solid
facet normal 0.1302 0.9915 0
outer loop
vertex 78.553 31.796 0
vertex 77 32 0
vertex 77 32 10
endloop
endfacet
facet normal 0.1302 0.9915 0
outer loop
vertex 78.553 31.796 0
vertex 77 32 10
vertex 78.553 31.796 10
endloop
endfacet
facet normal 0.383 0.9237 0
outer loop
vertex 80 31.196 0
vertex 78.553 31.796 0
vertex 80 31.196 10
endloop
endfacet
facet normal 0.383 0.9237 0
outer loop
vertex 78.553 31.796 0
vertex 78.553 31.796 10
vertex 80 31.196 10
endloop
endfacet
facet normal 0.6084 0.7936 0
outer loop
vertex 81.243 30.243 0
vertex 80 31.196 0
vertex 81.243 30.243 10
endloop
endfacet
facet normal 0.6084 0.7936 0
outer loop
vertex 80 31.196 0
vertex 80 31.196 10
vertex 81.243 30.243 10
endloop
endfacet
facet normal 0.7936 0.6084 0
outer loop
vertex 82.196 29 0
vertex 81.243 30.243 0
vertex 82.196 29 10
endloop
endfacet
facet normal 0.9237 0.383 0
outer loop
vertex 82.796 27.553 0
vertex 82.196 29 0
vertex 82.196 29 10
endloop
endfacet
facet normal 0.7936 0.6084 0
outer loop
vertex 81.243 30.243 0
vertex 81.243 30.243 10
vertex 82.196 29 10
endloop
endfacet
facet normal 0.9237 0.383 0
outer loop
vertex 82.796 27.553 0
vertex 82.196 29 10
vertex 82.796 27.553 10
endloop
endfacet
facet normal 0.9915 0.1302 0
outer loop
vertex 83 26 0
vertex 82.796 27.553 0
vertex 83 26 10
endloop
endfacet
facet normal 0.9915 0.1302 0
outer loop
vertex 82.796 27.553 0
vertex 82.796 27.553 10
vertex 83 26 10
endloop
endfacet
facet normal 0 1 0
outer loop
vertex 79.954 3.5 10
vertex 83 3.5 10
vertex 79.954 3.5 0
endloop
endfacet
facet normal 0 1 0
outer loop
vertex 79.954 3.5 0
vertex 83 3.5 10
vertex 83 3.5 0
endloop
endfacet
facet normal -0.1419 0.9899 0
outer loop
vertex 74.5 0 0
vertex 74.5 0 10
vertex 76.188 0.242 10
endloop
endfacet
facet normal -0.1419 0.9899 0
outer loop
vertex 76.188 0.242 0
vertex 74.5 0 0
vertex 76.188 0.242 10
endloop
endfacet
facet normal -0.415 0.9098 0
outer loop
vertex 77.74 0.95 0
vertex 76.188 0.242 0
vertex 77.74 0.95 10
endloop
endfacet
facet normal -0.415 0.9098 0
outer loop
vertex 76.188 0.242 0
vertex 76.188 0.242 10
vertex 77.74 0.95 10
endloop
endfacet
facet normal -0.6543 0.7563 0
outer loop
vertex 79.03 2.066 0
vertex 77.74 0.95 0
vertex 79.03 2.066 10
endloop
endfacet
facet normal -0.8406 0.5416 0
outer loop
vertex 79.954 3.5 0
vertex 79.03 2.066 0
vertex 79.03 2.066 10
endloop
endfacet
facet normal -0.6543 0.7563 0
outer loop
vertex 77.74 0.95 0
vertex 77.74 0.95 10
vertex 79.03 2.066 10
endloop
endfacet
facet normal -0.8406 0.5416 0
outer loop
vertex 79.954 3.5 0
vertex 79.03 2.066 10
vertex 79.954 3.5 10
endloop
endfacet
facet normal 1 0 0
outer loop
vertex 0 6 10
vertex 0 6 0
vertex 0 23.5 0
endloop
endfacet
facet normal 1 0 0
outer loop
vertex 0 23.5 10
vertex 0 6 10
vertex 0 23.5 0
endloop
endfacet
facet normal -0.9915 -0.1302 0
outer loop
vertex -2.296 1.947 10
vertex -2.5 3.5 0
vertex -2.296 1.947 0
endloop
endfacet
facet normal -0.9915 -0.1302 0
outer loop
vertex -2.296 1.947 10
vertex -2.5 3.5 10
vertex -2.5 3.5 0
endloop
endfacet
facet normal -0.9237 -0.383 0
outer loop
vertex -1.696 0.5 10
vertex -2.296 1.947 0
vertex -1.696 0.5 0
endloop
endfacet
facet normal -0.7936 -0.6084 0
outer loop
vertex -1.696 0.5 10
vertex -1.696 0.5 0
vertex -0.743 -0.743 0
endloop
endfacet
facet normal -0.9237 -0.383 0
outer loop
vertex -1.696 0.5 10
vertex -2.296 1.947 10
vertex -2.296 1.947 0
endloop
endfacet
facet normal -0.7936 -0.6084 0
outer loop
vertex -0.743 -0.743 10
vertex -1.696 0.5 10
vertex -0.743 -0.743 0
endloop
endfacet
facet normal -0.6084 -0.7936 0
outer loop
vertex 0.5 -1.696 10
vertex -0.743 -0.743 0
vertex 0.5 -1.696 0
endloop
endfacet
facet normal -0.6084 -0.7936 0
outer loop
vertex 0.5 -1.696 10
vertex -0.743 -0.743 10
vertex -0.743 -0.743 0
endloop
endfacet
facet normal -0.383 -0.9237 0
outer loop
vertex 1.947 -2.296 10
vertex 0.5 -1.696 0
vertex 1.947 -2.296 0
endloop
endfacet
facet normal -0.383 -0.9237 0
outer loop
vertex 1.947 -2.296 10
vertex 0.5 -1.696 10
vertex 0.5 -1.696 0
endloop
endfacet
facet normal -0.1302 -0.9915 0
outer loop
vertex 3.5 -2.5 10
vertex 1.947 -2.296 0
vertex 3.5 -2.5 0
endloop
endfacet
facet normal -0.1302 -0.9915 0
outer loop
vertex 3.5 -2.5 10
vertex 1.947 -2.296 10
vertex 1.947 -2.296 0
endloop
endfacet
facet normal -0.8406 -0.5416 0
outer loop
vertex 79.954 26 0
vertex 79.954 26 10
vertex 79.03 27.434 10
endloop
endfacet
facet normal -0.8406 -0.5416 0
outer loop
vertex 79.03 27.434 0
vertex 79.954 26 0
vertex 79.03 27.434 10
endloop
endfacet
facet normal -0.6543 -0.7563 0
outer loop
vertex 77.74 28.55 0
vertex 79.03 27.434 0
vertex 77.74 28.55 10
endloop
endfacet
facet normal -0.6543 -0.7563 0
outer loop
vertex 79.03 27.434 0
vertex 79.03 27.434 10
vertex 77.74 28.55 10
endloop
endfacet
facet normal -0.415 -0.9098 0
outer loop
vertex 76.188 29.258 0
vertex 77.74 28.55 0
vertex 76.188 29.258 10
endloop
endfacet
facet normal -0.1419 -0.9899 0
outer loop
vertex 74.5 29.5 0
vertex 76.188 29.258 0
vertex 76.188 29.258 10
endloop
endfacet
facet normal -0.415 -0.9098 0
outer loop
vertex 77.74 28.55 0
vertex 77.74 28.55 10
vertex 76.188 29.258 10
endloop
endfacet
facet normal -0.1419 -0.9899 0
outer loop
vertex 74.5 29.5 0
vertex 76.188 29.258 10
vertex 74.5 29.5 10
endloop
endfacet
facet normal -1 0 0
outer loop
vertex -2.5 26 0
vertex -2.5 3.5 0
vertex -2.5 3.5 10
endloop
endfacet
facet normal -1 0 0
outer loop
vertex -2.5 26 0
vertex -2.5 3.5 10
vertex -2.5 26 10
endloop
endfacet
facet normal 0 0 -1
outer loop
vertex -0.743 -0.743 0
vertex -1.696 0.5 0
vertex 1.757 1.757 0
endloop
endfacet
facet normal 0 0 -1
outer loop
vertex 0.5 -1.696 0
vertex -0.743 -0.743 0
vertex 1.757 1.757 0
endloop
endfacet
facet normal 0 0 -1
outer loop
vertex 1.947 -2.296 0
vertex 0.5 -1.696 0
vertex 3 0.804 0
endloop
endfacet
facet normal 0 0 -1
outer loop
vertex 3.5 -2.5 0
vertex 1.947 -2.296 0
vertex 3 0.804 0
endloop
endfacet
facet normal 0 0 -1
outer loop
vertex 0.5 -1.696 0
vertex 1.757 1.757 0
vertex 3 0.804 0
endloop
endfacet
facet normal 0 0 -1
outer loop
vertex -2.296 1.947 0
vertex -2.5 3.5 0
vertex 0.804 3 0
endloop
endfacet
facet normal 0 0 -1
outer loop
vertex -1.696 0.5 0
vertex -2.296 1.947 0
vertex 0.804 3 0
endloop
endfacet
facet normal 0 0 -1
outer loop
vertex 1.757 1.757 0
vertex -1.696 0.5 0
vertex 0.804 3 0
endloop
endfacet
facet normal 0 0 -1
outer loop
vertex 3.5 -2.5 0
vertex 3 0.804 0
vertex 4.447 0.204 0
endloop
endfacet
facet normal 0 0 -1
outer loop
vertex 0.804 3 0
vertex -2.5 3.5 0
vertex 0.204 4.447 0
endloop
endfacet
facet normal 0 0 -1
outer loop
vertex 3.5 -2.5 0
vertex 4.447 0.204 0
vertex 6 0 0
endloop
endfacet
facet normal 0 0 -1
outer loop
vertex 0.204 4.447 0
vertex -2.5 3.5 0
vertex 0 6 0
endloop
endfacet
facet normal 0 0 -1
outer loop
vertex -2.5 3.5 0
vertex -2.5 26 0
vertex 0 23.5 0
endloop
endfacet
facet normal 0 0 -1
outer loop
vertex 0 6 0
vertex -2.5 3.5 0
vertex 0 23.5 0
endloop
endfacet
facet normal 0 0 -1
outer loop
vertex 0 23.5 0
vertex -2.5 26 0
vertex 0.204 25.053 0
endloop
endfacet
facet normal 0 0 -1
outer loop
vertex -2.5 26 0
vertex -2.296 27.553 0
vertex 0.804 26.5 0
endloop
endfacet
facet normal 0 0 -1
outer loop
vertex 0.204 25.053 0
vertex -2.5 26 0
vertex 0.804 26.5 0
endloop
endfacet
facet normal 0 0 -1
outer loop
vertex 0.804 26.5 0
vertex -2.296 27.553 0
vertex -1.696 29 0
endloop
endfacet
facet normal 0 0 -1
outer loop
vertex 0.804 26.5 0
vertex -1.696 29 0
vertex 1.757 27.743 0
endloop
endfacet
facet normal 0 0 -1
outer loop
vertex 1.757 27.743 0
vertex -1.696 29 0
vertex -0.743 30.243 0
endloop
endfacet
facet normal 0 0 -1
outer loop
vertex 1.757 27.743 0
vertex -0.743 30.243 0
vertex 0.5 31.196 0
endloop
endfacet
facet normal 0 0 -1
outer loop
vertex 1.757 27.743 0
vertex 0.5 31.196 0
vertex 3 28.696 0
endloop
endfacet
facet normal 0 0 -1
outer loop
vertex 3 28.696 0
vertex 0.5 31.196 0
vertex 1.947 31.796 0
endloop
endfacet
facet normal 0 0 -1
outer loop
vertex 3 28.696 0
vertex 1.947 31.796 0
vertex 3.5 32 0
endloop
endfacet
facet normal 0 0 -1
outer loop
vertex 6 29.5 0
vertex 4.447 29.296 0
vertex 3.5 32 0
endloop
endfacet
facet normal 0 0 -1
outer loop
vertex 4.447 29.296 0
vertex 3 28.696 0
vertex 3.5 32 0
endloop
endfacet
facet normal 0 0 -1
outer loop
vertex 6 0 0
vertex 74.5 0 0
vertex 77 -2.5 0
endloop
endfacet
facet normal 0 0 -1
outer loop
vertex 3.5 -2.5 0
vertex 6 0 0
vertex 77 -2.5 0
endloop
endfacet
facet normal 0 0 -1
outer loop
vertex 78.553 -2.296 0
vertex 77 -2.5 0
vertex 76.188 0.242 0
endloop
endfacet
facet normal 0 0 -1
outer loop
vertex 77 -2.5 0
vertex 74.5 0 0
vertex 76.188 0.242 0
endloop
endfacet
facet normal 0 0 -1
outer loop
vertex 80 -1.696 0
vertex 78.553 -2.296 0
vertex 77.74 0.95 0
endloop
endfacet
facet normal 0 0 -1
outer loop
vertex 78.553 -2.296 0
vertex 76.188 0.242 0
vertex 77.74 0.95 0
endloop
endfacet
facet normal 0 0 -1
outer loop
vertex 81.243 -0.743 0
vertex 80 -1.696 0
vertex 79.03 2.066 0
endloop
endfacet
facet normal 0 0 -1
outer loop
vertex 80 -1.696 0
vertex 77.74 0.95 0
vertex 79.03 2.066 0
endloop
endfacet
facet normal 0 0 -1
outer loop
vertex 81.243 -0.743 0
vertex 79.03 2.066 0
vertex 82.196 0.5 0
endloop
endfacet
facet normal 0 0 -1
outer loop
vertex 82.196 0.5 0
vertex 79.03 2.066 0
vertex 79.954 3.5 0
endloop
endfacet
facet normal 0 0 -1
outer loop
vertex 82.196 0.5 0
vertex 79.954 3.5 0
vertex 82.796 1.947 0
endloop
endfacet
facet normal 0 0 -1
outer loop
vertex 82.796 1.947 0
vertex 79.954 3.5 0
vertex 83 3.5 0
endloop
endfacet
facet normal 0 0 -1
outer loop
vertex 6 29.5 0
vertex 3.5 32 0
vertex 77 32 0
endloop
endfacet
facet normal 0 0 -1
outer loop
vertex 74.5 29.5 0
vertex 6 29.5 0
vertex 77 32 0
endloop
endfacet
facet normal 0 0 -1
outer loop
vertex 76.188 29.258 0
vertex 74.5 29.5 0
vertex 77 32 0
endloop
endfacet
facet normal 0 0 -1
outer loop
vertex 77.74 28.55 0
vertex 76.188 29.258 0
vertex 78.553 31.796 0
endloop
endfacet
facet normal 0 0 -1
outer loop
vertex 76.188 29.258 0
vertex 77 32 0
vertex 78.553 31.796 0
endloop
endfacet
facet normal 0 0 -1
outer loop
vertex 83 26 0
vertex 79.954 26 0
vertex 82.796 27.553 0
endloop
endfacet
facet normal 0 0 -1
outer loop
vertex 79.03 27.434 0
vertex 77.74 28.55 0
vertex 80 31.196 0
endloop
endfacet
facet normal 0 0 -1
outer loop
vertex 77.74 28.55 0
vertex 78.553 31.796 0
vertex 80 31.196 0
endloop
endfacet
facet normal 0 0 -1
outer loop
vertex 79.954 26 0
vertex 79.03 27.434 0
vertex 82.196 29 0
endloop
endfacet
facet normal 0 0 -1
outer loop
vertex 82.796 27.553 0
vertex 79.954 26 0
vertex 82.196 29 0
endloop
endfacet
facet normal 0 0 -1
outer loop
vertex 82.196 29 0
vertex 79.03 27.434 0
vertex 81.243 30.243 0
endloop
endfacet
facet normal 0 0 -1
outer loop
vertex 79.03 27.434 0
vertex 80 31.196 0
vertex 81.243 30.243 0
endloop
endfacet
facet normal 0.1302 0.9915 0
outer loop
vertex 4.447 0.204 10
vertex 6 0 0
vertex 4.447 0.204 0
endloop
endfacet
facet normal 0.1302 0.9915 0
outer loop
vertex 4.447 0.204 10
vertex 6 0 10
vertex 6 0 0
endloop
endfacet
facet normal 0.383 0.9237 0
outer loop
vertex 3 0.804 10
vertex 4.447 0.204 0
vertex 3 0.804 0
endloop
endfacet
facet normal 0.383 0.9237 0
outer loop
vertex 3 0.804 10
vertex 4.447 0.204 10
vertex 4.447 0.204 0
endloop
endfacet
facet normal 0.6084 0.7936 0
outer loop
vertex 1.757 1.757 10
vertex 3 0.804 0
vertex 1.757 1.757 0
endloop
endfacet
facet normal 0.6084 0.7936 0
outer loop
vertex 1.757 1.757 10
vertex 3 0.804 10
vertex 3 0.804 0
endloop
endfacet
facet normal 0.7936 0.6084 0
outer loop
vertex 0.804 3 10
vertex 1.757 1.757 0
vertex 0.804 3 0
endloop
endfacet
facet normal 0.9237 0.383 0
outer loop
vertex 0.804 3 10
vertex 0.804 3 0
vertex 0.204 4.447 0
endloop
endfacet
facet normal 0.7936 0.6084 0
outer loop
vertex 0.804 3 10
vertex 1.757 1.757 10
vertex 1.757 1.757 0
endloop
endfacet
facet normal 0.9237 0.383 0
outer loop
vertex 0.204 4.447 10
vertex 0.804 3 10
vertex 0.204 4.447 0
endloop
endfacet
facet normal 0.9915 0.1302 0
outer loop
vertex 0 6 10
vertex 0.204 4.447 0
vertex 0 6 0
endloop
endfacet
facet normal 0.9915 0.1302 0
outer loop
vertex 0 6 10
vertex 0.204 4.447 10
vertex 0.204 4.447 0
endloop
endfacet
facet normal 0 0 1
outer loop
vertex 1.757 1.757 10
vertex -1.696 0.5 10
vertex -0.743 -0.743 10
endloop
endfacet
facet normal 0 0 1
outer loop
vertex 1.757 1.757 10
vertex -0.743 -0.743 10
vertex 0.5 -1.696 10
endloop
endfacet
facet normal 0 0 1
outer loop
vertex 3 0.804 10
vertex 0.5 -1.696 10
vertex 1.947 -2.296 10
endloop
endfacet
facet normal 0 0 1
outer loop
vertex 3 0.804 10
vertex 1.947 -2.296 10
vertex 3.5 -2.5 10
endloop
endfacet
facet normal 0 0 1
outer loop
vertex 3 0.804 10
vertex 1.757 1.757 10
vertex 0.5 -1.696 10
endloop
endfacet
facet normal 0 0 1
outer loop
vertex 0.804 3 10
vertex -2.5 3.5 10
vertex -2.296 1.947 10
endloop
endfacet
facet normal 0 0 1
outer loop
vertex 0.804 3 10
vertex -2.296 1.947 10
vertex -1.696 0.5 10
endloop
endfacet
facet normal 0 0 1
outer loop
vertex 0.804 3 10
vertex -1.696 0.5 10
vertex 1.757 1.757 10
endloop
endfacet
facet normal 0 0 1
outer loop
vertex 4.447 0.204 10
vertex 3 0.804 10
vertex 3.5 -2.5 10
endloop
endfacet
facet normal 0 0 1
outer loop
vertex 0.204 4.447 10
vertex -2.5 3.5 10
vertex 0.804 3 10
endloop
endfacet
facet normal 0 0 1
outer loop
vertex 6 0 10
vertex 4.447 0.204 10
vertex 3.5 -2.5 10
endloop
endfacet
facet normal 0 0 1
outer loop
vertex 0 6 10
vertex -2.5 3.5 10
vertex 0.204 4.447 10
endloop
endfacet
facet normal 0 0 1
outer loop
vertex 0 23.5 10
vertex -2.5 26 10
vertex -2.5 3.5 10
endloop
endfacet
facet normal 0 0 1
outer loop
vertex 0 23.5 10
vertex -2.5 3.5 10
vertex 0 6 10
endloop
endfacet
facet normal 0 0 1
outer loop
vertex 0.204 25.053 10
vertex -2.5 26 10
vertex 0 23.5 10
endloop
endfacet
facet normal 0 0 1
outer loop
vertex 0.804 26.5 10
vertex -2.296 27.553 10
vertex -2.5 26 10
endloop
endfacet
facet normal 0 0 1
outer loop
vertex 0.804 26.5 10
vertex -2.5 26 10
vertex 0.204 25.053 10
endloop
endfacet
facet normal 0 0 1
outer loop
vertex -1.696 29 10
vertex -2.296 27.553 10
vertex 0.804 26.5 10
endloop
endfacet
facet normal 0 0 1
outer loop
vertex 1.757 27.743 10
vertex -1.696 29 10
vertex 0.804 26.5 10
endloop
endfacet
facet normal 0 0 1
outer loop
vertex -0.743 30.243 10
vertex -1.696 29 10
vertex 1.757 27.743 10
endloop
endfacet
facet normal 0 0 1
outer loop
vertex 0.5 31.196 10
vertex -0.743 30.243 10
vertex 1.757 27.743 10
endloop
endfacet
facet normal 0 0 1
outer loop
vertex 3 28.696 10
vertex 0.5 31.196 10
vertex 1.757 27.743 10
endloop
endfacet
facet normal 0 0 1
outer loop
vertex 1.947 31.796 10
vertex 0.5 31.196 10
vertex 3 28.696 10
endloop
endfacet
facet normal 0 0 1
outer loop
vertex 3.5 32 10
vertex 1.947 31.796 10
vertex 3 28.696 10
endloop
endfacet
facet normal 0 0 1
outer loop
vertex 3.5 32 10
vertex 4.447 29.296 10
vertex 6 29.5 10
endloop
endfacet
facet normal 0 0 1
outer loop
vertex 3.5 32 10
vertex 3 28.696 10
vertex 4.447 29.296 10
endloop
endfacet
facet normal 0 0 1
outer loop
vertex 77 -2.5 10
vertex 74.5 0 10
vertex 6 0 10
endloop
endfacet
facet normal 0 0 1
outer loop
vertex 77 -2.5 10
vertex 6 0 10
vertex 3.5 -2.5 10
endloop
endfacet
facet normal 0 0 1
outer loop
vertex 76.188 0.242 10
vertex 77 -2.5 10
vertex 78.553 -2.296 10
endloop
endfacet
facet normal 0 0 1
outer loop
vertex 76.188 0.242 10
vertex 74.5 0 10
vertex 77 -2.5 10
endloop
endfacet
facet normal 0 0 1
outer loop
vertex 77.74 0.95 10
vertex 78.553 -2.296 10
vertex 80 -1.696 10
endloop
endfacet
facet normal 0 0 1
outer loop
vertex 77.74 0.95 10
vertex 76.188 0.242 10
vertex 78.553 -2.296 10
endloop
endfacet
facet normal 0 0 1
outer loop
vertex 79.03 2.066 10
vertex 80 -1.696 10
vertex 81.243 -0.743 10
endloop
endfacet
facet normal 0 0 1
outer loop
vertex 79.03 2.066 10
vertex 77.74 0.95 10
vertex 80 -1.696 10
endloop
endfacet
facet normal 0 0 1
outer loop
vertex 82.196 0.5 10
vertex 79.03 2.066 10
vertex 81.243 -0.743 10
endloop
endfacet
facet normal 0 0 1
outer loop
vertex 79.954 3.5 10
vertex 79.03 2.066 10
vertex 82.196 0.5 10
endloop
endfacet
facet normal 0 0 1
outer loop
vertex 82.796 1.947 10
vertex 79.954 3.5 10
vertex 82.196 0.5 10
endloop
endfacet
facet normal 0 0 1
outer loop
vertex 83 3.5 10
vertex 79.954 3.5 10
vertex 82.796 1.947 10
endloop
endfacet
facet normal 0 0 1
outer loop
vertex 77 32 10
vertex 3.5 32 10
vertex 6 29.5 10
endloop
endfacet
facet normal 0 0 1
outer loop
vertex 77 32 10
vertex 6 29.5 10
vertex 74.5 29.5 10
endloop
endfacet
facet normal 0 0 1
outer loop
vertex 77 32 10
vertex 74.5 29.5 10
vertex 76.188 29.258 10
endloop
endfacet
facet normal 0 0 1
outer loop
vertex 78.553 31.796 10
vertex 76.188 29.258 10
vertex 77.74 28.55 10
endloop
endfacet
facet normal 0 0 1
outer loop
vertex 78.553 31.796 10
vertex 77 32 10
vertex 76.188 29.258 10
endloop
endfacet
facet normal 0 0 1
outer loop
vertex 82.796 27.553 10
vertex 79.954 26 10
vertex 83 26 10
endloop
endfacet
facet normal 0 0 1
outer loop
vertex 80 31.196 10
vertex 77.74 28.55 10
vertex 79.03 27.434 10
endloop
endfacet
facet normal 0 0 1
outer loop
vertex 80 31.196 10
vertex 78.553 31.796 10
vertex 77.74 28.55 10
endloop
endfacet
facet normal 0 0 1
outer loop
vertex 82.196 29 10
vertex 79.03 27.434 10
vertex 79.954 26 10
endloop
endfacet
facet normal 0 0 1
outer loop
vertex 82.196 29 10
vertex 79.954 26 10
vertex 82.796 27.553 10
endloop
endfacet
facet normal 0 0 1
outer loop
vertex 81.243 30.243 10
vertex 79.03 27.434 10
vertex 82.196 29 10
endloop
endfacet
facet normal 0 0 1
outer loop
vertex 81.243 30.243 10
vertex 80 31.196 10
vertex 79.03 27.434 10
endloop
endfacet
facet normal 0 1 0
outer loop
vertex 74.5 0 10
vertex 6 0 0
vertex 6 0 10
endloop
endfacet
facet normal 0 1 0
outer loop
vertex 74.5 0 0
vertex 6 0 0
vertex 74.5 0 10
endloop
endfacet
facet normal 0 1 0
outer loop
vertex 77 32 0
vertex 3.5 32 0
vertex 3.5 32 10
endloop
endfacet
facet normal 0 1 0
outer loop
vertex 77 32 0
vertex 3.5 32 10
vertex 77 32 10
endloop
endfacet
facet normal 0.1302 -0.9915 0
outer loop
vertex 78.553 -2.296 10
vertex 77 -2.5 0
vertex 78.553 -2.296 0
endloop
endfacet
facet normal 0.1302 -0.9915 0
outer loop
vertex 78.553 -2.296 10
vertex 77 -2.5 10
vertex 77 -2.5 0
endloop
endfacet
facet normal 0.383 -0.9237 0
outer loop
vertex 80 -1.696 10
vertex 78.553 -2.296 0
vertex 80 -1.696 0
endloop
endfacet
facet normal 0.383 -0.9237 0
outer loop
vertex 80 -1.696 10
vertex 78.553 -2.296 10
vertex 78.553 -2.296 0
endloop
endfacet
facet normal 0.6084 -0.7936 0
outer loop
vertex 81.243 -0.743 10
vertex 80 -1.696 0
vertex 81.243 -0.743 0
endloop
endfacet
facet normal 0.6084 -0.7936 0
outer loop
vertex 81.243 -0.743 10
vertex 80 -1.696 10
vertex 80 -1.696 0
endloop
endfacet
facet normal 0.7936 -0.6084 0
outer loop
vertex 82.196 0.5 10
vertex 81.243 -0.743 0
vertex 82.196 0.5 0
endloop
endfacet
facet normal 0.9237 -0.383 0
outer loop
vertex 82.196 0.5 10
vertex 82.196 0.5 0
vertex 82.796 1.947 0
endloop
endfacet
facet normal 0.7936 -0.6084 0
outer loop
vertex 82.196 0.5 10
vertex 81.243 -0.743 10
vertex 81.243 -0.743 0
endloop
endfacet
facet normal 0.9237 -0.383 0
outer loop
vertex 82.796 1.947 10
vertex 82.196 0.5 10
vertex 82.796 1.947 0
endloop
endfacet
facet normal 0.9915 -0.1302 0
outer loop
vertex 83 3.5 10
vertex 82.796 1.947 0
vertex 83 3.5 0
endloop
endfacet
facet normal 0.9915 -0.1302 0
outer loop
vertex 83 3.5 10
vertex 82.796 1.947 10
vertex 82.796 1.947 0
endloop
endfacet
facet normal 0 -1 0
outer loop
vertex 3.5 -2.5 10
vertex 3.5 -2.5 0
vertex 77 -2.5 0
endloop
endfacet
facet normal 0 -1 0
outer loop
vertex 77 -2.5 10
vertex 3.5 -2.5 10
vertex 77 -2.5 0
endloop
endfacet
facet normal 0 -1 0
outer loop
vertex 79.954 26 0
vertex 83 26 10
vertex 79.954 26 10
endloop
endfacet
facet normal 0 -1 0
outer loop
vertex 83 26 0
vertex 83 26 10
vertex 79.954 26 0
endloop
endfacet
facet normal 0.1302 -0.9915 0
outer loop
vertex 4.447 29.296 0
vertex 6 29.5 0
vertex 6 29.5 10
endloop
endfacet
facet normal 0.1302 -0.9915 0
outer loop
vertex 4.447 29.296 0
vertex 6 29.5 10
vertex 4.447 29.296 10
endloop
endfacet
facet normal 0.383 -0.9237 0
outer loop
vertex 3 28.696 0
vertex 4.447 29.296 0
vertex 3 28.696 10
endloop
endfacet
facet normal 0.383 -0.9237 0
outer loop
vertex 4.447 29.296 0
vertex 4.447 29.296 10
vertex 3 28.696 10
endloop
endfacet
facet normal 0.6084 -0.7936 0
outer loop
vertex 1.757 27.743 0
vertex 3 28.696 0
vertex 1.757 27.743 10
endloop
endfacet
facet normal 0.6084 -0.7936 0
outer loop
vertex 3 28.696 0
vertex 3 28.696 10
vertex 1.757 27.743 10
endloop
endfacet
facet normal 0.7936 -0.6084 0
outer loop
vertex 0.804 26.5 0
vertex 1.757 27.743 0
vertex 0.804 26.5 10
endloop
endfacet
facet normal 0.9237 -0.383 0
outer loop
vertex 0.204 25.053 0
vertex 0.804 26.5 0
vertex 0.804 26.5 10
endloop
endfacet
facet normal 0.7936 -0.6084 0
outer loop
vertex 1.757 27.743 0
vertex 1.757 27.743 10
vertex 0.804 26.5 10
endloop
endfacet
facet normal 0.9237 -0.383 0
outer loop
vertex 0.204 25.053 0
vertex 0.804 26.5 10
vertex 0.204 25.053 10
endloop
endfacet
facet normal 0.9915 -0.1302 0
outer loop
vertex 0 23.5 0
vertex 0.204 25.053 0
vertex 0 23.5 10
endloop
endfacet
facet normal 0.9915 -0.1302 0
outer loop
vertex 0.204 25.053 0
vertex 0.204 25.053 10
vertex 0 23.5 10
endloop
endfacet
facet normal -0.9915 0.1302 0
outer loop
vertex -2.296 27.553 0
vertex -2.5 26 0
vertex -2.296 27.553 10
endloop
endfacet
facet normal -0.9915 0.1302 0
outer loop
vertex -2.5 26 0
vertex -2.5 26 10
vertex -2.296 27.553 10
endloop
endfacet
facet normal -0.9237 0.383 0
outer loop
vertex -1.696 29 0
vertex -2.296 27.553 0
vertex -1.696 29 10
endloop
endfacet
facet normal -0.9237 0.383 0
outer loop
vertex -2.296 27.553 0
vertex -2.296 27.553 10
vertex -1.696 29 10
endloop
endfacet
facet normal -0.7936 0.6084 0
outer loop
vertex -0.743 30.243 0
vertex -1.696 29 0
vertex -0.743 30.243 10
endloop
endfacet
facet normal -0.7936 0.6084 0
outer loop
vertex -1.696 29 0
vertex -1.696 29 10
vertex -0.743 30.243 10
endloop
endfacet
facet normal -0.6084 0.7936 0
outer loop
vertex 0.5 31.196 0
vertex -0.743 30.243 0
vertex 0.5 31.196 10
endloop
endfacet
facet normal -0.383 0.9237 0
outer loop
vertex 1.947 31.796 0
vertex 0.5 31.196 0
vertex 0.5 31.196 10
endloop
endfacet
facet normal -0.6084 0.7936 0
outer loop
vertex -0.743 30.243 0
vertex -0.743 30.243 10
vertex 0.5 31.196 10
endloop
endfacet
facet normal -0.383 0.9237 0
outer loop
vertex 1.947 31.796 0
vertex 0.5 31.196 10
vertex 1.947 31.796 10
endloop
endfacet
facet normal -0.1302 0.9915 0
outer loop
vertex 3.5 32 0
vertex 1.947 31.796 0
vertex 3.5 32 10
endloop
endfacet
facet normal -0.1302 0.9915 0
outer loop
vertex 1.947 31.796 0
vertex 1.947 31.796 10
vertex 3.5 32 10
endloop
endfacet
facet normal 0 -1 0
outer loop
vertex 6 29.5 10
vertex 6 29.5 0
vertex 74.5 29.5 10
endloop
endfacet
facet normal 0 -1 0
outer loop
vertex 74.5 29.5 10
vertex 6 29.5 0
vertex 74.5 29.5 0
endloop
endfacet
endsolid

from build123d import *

# Parameters (mm, degrees)
ESQUISSE1_W             = 85.5
ESQUISSE1_H             = 34.5
ESQUISSE1_W_2           = 80.5
ESQUISSE1_H_2           = 29.5
BOSS_EXTRU_1_DEPTH      = 10
CONG_1_R                = 6
CONG_2_R                = 6
ESQUISSE3_W             = 10
ESQUISSE3_H             = 22.5
ENL_V_MAT_EXTRU_1_DEPTH = 10


with BuildPart() as part:
    # Esquisse1 → Boss.-Extru.1 (new body)
    with BuildSketch(Plane.XY):
        with Locations((40.25, 14.75)):
            Rectangle(ESQUISSE1_W, ESQUISSE1_H)
        with Locations((40.25, 14.75)):
            Rectangle(ESQUISSE1_W_2, ESQUISSE1_H_2, mode=Mode.SUBTRACT)
    extrude(amount=BOSS_EXTRU_1_DEPTH)

    # Congé1
    cong_1_edges = [part.edges().sort_by_distance(p)[0] for p in [
        (0, 29.5, 5),
        (0, 0, 5),
        (80.5, 0, 5),
        (80.5, 29.5, 5),
    ]]
    fillet(cong_1_edges, radius=CONG_1_R)

    # Congé2
    cong_2_edges = [part.edges().sort_by_distance(p)[0] for p in [
        (-2.5, 32, 5),
        (83, 32, 5),
        (83, -2.5, 5),
        (-2.5, -2.5, 5),
    ]]
    fillet(cong_2_edges, radius=CONG_2_R)

    # Esquisse3 → Enlèv. mat.-Extru.1 (cut)
    with BuildSketch(Plane(origin=(83, 0, 0), x_dir=(0, 0, -1), z_dir=(1, 0, 0))):
        with Locations((-5, 14.75)):
            Rectangle(ESQUISSE3_W, ESQUISSE3_H)
    extrude(amount=-ENL_V_MAT_EXTRU_1_DEPTH, mode=Mode.SUBTRACT)


solid = part.part
